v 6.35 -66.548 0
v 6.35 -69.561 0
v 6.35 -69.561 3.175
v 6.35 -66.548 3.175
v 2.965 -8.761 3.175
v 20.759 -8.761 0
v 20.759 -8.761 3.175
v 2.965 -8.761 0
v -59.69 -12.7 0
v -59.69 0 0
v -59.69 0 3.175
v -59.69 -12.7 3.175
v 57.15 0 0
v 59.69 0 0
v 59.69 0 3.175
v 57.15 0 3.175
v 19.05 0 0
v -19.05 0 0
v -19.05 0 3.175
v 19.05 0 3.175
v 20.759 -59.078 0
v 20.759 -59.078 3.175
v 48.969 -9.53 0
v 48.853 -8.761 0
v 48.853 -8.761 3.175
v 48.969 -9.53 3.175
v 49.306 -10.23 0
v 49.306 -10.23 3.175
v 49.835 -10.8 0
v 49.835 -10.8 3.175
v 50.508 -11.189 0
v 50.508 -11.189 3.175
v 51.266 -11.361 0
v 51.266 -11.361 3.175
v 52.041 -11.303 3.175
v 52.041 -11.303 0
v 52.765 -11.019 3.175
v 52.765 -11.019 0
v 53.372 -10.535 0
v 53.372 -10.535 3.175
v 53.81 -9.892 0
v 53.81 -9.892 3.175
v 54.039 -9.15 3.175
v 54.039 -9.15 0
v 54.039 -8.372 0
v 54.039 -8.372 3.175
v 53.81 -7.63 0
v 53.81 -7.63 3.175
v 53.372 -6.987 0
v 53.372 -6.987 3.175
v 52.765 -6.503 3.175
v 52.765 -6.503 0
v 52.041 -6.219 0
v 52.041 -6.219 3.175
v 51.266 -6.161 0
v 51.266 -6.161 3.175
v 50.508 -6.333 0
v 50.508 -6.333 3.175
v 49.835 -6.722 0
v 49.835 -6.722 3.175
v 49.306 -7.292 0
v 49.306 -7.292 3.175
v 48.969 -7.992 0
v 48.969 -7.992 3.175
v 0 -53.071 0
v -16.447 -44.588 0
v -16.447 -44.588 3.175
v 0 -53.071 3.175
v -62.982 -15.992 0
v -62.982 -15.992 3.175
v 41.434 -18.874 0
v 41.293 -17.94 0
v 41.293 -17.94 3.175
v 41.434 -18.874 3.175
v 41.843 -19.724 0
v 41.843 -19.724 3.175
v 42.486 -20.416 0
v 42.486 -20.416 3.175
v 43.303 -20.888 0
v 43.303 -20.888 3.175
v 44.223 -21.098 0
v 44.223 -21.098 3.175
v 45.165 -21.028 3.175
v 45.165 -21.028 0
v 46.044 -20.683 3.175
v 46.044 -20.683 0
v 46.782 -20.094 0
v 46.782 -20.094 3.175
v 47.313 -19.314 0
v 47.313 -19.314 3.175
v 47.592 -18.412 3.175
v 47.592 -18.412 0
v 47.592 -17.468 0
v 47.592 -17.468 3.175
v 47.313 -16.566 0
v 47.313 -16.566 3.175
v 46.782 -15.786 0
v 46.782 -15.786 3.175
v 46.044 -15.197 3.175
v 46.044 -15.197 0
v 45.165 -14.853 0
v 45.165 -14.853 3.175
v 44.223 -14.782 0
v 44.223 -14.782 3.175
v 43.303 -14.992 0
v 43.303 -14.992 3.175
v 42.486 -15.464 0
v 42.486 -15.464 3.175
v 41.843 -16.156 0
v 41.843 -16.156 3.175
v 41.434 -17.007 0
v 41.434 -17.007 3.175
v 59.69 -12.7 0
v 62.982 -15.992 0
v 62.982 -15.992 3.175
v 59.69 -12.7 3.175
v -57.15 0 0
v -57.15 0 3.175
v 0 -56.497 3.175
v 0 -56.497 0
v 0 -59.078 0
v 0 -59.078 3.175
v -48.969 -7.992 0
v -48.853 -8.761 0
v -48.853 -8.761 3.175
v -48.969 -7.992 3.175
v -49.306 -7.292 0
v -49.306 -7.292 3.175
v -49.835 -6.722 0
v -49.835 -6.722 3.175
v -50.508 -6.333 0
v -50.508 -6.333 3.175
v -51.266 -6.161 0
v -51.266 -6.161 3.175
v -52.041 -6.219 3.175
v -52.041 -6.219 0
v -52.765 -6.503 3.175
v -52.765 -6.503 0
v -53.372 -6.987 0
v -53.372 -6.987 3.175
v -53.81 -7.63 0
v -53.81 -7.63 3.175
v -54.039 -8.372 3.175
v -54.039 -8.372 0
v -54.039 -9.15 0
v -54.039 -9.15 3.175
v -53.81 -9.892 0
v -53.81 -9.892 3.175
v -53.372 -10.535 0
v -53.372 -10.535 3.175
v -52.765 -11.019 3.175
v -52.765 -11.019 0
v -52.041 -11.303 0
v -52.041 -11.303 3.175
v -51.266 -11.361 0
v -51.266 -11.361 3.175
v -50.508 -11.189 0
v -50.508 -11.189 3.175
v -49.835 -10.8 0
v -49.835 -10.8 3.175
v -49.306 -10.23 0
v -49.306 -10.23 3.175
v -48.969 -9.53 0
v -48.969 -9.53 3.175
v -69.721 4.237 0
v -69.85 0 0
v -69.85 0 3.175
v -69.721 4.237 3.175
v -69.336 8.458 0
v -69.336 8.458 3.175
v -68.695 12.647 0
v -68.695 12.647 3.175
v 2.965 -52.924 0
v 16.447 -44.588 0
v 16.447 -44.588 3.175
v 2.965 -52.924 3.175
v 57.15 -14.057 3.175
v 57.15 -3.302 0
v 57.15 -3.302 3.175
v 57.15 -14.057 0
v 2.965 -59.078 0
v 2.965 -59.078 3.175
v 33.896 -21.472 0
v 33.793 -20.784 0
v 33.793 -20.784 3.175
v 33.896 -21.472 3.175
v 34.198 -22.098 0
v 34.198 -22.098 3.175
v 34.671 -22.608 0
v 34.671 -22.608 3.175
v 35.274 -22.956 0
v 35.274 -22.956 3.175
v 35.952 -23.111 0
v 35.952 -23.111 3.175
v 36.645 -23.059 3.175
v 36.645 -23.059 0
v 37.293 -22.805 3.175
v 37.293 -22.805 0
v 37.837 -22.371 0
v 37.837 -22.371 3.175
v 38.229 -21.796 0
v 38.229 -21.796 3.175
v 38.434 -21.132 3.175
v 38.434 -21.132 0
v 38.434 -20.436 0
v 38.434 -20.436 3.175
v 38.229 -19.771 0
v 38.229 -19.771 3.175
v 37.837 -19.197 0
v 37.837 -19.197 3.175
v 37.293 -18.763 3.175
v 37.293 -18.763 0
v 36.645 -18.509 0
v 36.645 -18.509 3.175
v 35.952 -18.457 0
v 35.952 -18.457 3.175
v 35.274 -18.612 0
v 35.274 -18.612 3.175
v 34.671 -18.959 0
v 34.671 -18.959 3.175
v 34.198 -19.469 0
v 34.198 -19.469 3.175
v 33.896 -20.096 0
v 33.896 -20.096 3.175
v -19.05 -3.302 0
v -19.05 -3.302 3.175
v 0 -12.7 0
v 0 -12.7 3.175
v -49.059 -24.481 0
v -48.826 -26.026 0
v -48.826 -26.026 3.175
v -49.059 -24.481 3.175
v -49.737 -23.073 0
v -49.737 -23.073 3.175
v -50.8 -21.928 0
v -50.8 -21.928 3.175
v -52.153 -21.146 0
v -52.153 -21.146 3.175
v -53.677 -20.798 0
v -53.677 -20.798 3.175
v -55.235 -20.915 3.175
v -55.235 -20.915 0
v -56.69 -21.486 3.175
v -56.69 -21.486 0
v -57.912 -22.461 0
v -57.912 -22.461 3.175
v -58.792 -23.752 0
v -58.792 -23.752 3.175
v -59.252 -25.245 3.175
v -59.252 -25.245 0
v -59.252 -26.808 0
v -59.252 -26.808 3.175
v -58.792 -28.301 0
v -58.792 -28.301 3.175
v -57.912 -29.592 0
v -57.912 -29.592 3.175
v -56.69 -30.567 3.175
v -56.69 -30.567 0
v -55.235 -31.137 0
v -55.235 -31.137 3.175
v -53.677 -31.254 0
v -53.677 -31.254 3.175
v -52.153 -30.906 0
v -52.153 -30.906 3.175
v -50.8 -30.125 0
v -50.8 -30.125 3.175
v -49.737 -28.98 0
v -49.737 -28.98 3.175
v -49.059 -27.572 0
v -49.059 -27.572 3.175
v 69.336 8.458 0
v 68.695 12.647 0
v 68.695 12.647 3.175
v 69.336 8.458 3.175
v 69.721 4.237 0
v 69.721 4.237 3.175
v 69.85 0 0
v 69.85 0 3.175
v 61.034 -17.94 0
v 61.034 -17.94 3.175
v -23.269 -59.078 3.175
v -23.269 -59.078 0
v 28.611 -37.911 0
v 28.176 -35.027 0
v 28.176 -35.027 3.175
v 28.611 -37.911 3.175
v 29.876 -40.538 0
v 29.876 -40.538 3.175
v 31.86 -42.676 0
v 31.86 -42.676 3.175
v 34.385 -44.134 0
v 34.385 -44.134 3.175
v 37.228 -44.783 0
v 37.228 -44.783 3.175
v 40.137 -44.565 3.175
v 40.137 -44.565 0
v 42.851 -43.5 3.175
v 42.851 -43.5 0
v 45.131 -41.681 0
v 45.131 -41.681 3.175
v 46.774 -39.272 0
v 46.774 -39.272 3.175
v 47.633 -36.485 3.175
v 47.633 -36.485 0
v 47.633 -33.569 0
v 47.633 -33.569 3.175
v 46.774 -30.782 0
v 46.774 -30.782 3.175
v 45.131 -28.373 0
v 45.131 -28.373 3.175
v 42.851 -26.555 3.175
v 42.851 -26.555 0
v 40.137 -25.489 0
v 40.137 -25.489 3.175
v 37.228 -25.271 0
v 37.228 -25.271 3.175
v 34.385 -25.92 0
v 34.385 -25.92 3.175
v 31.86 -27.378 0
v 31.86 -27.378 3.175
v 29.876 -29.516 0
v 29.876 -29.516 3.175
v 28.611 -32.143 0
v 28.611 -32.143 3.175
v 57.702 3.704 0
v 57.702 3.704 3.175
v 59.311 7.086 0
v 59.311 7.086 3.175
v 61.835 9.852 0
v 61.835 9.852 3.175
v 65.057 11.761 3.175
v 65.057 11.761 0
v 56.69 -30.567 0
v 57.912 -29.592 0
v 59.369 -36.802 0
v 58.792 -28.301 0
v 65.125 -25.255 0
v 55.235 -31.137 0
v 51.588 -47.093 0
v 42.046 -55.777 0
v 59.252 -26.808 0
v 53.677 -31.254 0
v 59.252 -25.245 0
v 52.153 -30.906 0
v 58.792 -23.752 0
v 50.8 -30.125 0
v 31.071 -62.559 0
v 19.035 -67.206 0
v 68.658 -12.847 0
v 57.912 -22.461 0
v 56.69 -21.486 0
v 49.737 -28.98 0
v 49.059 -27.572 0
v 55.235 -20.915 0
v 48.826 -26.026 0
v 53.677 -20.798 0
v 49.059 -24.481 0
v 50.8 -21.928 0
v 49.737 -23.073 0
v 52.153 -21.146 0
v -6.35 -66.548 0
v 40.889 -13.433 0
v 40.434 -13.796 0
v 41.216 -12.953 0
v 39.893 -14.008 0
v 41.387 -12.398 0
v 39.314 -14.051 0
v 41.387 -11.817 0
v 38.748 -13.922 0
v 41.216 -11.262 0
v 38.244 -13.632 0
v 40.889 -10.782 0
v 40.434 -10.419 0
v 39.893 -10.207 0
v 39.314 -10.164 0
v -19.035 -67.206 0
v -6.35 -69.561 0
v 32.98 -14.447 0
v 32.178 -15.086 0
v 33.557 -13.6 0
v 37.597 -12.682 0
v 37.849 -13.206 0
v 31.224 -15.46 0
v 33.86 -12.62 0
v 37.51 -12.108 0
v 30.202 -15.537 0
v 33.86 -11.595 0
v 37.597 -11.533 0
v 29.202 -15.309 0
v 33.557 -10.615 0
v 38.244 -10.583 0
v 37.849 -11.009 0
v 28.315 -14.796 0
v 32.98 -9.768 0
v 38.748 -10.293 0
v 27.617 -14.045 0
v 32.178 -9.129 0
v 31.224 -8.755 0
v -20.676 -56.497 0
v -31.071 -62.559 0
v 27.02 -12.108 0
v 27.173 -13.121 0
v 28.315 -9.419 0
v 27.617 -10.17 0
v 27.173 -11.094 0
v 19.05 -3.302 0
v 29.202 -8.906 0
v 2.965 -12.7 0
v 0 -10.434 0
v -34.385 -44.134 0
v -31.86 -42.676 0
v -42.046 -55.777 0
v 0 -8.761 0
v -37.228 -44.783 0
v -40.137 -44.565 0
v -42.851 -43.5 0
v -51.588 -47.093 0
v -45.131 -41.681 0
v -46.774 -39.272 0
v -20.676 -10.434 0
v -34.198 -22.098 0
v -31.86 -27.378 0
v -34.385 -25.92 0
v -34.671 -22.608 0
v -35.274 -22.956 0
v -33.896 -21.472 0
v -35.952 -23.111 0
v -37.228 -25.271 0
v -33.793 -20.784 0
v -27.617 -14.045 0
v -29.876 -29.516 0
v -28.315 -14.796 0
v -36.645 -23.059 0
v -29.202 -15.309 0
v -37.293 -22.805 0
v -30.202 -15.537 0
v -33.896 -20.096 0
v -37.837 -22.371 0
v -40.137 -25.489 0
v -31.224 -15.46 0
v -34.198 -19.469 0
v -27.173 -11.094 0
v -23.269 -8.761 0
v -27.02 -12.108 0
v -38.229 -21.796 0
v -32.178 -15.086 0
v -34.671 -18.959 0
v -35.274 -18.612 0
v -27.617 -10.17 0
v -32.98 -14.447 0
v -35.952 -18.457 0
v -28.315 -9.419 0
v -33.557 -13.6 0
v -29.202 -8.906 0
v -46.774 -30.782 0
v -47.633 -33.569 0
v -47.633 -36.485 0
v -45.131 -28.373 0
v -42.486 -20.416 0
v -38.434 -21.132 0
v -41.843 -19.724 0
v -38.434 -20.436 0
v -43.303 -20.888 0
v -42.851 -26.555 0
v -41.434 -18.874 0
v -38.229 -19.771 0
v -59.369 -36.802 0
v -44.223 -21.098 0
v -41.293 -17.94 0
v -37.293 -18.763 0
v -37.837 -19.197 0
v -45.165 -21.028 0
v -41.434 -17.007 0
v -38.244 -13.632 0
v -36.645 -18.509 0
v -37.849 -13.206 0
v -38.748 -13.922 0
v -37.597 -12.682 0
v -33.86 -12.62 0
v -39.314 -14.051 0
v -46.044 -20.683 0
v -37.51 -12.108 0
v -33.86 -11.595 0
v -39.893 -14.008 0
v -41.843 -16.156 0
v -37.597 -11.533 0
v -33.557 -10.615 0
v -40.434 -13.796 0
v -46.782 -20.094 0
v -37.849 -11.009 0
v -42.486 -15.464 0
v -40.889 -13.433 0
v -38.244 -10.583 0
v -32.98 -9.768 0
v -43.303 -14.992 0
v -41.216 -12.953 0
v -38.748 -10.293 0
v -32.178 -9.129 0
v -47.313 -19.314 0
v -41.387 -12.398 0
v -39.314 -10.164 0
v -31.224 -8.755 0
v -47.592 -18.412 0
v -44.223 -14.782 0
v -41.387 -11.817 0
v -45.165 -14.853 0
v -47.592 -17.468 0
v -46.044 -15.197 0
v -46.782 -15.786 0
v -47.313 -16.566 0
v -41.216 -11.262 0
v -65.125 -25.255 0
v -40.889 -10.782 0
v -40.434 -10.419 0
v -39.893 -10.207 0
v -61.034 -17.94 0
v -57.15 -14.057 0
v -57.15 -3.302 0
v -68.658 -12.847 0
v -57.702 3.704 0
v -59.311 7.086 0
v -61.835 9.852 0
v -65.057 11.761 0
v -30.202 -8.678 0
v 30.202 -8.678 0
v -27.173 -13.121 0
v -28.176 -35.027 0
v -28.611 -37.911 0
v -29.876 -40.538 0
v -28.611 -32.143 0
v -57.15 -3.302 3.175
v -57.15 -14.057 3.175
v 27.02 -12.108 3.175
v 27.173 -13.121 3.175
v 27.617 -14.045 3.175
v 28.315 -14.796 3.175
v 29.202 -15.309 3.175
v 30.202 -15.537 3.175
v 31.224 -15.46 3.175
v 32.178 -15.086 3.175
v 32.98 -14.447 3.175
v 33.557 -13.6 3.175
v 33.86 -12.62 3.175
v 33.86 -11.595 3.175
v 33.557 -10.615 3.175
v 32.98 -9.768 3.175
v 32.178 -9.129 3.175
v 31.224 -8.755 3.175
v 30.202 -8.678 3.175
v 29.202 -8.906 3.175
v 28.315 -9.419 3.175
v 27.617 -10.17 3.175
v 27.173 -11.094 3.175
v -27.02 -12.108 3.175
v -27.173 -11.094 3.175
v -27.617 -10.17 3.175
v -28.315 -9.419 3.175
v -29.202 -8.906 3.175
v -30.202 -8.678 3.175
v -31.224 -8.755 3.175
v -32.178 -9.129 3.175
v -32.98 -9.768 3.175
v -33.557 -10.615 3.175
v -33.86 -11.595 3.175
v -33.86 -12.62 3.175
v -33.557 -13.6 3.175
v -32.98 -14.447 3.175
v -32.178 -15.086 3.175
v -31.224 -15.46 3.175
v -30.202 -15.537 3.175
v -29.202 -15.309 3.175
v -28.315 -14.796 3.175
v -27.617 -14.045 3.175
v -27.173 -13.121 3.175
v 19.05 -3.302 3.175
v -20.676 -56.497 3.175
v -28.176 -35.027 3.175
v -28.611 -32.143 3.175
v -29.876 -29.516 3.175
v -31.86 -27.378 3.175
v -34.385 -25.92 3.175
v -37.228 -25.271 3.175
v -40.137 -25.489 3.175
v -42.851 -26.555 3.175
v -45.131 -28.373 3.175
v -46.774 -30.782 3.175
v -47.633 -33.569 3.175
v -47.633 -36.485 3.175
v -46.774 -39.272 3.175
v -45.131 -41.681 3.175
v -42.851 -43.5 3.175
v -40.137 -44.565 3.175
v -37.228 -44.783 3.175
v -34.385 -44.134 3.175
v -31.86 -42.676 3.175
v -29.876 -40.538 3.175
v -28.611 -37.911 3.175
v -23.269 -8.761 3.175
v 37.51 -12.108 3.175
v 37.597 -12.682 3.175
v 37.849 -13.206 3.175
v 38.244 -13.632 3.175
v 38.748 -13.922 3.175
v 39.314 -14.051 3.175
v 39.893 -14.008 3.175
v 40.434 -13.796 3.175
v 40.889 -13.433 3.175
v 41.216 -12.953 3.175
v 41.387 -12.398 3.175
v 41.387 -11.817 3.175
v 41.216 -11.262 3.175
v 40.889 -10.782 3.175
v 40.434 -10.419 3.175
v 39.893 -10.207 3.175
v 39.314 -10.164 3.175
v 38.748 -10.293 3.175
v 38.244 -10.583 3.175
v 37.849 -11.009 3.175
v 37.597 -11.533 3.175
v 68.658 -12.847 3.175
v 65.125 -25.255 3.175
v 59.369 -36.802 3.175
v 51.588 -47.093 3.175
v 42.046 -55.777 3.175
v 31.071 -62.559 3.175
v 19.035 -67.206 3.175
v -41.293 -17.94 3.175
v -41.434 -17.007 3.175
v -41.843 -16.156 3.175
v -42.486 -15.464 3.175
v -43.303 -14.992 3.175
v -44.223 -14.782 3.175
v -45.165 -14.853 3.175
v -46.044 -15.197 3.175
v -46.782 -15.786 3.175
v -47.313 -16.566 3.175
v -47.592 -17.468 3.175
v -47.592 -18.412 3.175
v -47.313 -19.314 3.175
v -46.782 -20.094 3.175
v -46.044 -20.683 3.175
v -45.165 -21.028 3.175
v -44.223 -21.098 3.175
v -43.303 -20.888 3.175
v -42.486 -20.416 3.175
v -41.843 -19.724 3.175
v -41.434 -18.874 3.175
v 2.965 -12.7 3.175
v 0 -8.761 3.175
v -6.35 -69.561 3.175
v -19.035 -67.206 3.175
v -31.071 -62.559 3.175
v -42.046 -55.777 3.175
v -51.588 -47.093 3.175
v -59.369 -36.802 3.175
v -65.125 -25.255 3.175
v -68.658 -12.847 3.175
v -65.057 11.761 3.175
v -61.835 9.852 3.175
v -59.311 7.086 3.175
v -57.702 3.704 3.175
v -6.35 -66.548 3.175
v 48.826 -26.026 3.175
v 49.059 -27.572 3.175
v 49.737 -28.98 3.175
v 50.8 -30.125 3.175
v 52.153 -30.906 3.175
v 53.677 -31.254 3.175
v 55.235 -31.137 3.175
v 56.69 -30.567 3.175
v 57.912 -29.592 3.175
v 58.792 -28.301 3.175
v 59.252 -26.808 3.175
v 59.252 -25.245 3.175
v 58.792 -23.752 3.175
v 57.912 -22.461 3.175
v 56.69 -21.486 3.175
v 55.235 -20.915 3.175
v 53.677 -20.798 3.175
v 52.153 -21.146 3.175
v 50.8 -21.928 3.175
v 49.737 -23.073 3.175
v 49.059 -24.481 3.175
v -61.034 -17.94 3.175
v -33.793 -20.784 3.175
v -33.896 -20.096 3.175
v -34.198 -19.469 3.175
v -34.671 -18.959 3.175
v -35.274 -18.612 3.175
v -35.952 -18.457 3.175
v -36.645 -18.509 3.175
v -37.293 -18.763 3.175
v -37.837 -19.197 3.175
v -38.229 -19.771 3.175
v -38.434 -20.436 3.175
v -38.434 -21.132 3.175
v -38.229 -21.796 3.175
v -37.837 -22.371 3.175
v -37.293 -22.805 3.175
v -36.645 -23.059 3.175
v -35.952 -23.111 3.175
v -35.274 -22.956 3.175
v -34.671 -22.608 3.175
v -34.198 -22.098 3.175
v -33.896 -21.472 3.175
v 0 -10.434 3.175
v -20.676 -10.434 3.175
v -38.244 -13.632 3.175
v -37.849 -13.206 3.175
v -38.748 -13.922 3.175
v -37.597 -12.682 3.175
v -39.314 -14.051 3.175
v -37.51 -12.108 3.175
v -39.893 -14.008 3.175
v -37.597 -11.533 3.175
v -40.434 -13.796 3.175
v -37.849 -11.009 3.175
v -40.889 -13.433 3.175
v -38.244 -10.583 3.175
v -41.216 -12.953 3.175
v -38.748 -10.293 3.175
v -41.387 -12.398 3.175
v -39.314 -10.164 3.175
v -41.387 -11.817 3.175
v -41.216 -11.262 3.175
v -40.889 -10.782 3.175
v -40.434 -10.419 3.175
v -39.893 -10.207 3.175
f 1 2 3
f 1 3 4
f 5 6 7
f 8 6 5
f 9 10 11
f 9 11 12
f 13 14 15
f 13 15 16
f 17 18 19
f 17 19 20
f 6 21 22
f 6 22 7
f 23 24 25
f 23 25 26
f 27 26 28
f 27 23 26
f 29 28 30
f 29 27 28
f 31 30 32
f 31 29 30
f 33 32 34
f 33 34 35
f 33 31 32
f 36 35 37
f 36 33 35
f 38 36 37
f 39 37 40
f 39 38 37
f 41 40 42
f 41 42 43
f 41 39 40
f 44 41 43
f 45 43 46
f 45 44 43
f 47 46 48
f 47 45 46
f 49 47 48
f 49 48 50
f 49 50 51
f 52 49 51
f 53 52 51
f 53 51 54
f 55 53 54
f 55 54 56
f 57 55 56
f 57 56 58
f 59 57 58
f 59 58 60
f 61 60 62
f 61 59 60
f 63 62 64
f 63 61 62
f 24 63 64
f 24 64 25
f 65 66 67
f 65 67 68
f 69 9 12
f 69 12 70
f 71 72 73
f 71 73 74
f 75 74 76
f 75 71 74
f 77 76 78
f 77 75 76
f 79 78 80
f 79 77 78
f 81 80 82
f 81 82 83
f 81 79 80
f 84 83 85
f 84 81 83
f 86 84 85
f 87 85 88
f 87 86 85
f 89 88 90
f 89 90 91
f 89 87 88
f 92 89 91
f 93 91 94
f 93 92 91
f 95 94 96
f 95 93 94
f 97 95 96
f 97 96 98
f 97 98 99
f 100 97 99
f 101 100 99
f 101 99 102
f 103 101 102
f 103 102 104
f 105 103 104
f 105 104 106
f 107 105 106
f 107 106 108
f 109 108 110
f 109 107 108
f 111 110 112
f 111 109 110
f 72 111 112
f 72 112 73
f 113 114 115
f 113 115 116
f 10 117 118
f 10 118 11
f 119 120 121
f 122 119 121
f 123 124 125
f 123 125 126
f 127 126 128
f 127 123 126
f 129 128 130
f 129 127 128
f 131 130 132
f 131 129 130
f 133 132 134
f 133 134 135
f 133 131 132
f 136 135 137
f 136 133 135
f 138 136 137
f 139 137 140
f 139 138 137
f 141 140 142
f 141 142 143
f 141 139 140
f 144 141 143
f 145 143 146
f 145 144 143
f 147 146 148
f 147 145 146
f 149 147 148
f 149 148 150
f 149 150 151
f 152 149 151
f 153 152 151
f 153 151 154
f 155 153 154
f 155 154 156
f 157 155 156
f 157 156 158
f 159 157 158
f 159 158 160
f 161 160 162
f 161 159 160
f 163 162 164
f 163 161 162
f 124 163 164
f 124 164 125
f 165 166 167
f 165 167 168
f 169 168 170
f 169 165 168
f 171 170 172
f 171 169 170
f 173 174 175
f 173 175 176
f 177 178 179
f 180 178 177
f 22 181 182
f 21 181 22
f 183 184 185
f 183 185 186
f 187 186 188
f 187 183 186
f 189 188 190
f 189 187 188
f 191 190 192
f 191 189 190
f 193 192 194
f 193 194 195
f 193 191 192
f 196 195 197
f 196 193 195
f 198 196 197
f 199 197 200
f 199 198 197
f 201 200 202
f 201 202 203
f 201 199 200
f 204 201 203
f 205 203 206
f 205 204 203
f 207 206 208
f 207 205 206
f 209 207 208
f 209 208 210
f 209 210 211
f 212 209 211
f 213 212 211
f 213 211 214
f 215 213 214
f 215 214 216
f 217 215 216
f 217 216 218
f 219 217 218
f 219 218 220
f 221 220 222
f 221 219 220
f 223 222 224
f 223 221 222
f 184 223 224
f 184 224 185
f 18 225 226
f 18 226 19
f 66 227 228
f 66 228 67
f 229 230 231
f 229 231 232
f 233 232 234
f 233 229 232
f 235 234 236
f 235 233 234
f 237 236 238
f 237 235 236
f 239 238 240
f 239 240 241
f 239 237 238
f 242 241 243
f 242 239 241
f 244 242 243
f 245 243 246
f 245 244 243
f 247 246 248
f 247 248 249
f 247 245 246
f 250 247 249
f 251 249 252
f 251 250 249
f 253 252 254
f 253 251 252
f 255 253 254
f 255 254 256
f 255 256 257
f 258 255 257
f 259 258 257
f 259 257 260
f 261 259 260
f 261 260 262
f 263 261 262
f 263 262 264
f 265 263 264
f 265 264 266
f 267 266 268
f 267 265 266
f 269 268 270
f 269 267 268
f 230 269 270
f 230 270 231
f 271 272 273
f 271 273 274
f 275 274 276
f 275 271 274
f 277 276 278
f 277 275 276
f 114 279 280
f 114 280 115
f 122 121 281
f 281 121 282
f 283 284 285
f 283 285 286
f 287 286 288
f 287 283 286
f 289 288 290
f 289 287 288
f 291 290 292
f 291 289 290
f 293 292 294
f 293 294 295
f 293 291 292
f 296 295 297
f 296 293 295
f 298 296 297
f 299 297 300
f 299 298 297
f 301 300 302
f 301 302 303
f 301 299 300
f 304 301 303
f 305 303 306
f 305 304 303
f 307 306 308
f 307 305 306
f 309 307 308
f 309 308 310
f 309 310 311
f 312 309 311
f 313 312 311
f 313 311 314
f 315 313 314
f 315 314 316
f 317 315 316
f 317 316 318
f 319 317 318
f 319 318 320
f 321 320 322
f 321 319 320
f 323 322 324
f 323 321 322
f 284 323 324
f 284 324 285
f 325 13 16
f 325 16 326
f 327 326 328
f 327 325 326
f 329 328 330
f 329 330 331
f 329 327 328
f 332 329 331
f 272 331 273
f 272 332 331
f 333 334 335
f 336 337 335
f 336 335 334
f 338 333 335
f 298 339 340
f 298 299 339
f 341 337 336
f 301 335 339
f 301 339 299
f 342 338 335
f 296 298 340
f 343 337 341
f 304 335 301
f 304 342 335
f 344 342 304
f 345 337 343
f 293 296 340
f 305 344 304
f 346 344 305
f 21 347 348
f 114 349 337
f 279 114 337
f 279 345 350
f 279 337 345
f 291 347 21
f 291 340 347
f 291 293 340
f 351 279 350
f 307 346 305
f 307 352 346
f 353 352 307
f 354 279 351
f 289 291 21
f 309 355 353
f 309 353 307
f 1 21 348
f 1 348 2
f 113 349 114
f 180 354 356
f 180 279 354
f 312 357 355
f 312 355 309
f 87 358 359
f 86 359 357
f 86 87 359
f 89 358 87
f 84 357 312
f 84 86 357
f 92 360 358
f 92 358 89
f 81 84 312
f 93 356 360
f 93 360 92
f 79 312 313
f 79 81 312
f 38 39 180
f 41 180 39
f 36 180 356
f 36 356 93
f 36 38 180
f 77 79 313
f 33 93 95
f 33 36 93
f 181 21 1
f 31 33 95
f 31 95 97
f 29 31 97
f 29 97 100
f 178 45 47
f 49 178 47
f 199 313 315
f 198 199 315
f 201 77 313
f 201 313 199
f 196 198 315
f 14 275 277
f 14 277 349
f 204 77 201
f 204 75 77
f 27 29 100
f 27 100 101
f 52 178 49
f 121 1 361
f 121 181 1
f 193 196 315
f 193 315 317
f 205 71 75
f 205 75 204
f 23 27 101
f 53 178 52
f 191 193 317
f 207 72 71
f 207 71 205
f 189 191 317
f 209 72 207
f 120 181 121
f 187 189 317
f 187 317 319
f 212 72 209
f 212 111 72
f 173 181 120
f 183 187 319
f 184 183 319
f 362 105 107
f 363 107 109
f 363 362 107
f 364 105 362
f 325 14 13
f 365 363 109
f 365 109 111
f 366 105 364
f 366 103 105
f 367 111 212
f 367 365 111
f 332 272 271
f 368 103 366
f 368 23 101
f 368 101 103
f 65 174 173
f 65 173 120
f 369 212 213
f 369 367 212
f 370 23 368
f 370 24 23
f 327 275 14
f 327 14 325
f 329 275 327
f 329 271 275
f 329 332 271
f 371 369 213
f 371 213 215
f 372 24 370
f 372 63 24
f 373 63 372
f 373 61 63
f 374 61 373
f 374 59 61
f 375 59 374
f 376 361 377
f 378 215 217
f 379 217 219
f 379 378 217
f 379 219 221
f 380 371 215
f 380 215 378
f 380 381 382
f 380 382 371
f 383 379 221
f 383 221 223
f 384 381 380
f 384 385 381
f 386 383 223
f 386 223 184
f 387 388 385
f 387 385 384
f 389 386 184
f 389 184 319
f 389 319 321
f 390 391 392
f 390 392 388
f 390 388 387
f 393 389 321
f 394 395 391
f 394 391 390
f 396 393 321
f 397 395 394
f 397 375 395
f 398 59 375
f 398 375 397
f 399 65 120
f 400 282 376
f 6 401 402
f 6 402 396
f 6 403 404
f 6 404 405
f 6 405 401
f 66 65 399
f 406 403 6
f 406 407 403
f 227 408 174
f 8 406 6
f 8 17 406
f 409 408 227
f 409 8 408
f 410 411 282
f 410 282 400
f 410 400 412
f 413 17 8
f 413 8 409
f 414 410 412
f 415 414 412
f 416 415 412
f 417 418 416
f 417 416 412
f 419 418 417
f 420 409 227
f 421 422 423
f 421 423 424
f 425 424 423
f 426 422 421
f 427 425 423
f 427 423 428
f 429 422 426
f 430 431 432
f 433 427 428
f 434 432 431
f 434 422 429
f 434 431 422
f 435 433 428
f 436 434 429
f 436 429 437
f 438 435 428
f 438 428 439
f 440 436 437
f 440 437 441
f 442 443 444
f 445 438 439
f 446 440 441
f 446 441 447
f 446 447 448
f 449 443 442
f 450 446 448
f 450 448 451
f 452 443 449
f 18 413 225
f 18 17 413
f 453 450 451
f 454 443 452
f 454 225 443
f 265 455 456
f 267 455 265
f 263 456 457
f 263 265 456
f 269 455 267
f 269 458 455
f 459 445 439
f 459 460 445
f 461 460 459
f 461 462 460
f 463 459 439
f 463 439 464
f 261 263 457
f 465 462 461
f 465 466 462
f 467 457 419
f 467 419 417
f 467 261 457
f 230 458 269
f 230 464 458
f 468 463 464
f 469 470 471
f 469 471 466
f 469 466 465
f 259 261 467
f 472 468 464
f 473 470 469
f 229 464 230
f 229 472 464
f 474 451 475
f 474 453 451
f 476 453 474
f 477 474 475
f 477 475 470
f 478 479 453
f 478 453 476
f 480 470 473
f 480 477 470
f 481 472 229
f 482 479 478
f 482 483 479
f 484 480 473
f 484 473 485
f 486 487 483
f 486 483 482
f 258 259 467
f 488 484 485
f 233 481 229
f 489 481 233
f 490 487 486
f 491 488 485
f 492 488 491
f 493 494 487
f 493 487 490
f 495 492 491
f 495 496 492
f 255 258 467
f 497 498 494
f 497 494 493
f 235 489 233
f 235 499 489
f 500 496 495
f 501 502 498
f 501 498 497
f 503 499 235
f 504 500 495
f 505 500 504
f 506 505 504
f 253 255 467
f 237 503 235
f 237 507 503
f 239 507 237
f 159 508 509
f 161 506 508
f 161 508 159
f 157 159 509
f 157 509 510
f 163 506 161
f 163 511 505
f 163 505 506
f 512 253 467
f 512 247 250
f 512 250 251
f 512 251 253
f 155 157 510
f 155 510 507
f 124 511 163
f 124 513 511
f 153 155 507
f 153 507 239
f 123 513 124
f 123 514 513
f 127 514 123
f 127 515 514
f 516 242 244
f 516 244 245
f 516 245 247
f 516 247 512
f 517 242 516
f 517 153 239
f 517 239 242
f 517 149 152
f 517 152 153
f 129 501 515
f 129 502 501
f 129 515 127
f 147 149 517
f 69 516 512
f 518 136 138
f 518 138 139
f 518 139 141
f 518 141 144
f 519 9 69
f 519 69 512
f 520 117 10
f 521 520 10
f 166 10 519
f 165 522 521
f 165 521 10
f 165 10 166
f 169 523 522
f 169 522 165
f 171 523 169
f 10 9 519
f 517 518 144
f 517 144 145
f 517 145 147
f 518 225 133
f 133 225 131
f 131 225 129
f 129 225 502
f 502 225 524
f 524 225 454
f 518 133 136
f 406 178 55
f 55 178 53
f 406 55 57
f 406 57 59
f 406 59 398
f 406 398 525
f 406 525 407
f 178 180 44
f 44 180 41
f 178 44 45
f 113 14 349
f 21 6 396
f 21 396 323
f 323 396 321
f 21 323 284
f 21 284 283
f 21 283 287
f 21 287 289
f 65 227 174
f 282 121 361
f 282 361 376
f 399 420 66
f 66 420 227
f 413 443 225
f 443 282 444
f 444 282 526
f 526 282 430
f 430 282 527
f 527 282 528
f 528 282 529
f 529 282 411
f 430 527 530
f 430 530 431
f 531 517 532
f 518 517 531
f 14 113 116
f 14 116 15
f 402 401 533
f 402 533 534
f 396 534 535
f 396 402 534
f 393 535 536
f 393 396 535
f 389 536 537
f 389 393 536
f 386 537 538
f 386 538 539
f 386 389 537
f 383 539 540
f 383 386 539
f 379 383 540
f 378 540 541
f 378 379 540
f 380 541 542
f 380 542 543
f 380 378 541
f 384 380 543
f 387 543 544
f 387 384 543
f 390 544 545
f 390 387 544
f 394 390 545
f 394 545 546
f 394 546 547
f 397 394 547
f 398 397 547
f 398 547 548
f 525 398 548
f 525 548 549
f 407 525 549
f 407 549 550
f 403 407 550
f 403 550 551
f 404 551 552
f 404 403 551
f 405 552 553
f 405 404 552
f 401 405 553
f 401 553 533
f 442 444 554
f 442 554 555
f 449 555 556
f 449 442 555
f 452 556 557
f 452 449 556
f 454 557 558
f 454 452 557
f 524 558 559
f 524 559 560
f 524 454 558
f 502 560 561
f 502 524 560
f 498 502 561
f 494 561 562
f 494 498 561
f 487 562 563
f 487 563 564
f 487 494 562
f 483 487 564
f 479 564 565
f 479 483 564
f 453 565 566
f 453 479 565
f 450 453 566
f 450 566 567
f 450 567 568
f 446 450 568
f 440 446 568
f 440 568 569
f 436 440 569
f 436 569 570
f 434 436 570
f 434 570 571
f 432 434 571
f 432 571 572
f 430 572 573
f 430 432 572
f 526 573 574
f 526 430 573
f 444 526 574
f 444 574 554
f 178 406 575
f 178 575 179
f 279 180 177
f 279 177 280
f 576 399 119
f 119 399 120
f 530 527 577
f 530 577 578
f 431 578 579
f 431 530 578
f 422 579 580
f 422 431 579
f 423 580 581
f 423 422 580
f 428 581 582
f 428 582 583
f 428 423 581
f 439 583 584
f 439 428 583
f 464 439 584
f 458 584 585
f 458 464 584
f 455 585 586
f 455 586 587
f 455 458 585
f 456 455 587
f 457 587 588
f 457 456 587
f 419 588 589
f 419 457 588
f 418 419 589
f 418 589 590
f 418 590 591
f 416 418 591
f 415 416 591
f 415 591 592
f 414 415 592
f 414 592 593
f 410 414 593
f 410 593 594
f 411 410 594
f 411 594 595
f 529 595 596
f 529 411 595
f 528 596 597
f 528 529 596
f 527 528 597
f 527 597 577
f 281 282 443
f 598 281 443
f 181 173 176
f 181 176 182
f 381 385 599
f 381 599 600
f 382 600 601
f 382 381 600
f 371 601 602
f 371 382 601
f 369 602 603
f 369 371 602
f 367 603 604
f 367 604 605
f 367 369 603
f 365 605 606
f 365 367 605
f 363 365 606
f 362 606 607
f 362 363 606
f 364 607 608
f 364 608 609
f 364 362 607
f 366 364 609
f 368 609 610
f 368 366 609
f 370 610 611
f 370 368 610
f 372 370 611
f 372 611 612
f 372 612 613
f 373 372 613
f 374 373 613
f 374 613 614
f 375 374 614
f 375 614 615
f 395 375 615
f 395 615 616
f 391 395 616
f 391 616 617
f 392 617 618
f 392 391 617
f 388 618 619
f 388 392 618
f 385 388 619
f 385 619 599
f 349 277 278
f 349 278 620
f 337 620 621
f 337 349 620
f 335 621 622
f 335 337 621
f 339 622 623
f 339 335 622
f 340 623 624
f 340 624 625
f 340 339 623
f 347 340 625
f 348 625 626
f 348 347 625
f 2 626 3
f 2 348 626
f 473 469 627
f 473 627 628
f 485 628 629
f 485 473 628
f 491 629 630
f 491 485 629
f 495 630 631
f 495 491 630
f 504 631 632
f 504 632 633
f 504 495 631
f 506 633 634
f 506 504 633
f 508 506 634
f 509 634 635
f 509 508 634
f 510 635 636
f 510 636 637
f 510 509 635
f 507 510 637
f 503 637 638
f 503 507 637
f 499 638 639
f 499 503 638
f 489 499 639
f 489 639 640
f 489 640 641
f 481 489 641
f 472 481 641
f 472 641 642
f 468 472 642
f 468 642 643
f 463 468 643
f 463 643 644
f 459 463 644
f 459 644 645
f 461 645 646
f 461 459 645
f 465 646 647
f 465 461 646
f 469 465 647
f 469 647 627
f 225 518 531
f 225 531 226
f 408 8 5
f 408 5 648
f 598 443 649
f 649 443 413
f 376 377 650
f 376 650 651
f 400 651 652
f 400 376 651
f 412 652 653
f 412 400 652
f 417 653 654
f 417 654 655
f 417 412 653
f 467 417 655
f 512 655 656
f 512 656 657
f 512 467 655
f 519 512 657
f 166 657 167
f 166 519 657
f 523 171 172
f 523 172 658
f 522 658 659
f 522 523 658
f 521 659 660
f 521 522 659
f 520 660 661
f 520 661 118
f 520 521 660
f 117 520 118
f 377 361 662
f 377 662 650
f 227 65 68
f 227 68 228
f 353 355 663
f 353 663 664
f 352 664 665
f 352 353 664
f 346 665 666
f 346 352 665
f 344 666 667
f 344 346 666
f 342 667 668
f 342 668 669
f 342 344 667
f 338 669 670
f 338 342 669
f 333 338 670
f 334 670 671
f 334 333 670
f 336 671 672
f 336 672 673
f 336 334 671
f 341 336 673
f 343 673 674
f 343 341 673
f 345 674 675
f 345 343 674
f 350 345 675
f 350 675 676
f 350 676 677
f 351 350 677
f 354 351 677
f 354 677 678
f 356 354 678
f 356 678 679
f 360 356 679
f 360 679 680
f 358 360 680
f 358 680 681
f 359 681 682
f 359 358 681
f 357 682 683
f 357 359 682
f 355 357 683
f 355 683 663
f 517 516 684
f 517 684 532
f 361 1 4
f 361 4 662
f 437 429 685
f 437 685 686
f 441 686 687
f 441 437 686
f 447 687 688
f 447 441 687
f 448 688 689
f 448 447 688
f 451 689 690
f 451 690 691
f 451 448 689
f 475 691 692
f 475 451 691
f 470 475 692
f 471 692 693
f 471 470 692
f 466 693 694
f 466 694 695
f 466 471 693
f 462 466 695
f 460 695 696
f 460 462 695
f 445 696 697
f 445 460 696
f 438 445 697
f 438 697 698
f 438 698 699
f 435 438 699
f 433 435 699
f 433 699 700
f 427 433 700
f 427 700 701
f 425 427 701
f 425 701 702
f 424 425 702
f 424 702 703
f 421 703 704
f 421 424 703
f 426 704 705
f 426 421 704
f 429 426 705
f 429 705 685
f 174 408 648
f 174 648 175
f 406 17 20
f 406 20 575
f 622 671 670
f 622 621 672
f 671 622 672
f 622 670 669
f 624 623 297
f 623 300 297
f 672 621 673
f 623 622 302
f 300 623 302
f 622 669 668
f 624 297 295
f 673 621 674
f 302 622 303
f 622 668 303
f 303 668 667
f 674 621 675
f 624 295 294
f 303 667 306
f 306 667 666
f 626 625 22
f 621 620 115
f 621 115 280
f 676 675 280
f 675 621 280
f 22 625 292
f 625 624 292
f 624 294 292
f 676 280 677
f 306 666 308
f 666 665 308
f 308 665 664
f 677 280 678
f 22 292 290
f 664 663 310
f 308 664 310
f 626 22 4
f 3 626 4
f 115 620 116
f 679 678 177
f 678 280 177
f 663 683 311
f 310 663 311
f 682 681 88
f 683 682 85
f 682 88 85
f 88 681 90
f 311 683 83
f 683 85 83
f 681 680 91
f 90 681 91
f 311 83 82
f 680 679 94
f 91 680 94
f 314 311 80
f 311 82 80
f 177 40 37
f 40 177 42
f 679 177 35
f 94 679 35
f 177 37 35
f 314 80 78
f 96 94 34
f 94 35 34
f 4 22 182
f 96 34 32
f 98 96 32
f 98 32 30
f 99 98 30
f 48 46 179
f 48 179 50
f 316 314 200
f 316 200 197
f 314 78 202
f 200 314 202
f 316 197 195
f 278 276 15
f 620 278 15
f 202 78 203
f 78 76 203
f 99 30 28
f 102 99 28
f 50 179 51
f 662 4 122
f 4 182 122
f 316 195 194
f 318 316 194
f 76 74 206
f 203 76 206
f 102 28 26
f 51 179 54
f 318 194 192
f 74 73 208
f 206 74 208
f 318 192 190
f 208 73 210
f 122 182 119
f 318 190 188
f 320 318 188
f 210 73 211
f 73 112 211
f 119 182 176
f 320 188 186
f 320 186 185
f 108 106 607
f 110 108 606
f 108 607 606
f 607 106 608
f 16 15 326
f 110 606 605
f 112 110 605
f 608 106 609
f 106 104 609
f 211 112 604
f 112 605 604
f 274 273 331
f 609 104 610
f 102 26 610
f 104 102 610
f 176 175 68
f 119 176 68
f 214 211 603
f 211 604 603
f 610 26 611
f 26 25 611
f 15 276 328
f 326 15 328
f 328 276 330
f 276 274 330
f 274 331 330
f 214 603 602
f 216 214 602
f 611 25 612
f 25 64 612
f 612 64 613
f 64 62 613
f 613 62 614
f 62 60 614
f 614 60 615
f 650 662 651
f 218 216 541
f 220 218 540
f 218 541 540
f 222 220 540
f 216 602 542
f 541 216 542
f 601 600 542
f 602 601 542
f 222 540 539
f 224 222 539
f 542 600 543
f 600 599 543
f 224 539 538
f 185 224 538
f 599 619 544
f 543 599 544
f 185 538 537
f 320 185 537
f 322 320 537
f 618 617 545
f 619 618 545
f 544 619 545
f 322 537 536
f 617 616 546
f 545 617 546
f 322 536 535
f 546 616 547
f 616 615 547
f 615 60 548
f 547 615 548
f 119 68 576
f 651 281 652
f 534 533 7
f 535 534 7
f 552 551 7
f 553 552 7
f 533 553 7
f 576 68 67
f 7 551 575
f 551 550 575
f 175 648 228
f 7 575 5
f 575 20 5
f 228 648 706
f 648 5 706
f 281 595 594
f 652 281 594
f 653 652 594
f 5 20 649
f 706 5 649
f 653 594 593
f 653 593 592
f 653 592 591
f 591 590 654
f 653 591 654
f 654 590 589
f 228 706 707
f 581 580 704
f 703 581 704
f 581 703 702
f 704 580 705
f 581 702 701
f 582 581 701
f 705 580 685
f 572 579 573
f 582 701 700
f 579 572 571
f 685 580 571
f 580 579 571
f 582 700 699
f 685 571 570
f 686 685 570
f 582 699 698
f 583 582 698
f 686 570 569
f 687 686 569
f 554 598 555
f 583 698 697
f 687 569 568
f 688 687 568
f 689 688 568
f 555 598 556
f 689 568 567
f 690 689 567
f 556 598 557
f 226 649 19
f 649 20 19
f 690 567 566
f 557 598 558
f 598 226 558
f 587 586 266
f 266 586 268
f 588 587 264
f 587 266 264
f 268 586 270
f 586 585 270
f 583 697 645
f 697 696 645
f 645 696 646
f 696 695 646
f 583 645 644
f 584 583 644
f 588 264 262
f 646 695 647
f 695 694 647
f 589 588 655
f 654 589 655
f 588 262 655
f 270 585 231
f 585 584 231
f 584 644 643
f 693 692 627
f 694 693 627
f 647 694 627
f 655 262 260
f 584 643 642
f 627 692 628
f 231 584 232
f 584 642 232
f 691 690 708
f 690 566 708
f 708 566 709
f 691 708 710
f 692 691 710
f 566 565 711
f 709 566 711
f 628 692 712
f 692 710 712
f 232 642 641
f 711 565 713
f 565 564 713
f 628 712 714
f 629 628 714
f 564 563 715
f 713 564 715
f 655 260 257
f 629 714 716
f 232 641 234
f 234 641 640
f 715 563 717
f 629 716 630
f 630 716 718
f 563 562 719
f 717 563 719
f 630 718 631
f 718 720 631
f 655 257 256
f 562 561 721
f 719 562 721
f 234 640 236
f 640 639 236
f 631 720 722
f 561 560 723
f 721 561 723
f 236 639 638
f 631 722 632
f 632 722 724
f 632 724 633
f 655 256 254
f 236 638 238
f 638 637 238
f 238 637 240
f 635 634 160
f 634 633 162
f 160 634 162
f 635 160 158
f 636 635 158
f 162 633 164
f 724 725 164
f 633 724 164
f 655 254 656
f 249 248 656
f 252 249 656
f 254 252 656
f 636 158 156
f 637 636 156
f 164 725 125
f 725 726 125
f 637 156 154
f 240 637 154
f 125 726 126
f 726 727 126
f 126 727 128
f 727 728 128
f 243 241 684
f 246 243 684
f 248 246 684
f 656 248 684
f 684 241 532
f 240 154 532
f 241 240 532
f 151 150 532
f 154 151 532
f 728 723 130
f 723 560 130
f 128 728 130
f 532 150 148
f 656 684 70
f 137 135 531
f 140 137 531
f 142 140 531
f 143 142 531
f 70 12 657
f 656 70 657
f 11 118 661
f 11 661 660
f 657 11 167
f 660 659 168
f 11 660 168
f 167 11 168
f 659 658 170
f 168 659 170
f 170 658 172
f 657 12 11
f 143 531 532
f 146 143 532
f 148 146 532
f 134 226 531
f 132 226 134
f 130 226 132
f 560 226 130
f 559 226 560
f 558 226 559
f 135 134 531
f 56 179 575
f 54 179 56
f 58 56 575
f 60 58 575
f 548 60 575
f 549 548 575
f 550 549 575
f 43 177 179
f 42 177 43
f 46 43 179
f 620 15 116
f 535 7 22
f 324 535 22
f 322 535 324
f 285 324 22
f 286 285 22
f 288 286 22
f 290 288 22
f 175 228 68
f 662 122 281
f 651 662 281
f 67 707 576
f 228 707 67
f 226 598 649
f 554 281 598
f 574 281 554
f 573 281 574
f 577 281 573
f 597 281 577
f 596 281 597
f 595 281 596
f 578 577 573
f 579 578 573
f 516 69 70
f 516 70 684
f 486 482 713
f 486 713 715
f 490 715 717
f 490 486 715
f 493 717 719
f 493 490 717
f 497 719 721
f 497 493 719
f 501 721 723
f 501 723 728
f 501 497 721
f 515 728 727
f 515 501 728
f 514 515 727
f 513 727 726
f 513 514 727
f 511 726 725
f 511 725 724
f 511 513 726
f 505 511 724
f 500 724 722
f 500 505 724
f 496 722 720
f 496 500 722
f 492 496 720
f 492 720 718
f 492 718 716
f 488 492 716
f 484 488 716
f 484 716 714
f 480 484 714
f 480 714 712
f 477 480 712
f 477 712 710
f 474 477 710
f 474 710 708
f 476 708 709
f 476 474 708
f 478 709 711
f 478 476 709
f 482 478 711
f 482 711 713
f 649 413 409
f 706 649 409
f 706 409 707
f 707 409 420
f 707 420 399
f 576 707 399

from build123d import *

# Parameters (mm, degrees)
SKETCH1_R           = 2.60777722
SKETCH1_R_2         = 5.242542832
SKETCH1_R_3         = 3.166937391
SKETCH1_R_4         = 9.783190039
SKETCH1_R_5         = 3.439146742
SKETCH1_R_6         = 2.333532814
SKETCH1_R_7         = 1.949356062
BOSS_EXTRUDE1_DEPTH = 3.175


with BuildPart() as part:
    # Sketch1 → Boss-Extrude1 (new body)
    with BuildSketch(Plane.XY):
        with BuildLine():
            Line((-57.15, 0), (-59.69, 0))
            Line((-59.69, 0), (-59.69, -12.7))
            Line((-59.69, -12.7), (-62.981786531, -15.991786531))
            Line((-62.981786531, -15.991786531), (-61.033522603, -17.940050458))
            Line((-61.033522603, -17.940050458), (-57.15, -14.056527855))
            Line((-57.15, -14.056527855), (-57.15, -3.302))
            Line((-57.15, -3.302), (-19.05, -3.302))
            Line((-19.05, -3.302), (-19.05, 0))
            Line((-19.05, 0), (19.05, 0))
            Line((19.05, 0), (19.05, -3.302))
            Line((19.05, -3.302), (57.15, -3.302))
            Line((57.15, -3.302), (57.15, -14.056527855))
            Line((57.15, -14.056527855), (61.033522603, -17.940050458))
            Line((61.033522603, -17.940050458), (62.981786531, -15.991786531))
            Line((62.981786531, -15.991786531), (59.69, -12.7))
            Line((59.69, -12.7), (59.69, 0))
            Line((59.69, 0), (57.15, 0))
            ThreePointArc((57.15, 0), (60.470428387, 8.562338253), (68.695454545, 12.647411782))
            ThreePointArc((68.695454545, 12.647411782), (69.560764803, 6.35), (69.85, 0))
            ThreePointArc((69.85, 0), (51.587643869, -47.092860393), (6.35, -69.560764803))
            Line((6.35, -69.560764803), (6.35, -66.548))
            Line((6.35, -66.548), (-6.35, -66.548))
            Line((-6.35, -66.548), (-6.35, -69.560764803))
            ThreePointArc((-6.35, -69.560764803), (-51.587643869, -47.092860393), (-69.85, 0))
            ThreePointArc((-69.85, 0), (-69.560764803, 6.35), (-68.695454545, 12.647411782))
            ThreePointArc((-68.695454545, 12.647411782), (-60.470428387, 8.562338253), (-57.15, 0))
        make_face()
        with Locations((-51.460707528, -8.761001901)):
            Circle(SKETCH1_R, mode=Mode.SUBTRACT)
        with Locations((-54.068484748, -26.026352242)):
            Circle(SKETCH1_R_2, mode=Mode.SUBTRACT)
        with Locations((-44.460109085, -17.940050458)):
            Circle(SKETCH1_R_3, mode=Mode.SUBTRACT)
        with Locations((-37.959553388, -35.027121669)):
            Circle(SKETCH1_R_4, mode=Mode.SUBTRACT)
        with Locations((-30.458912199, -12.107533279)):
            Circle(SKETCH1_R_5, mode=Mode.SUBTRACT)
        with Locations((-36.126063319, -20.78380941)):
            Circle(SKETCH1_R_6, mode=Mode.SUBTRACT)
        with Locations((-39.459681626, -12.107533279)):
            Circle(SKETCH1_R_7, mode=Mode.SUBTRACT)
        with Locations(Location((37.959553388, -35.027121669, 0), (0, 0, 180))):
            Circle(SKETCH1_R_4, mode=Mode.SUBTRACT)
        with Locations(Location((36.126063319, -20.78380941, 0), (0, 0, 180))):
            Circle(SKETCH1_R_6, mode=Mode.SUBTRACT)
        with Locations(Location((30.458912199, -12.107533279, 0), (0, 0, 180))):
            Circle(SKETCH1_R_5, mode=Mode.SUBTRACT)
        with Locations(Location((39.459681626, -12.107533279, 0), (0, 0, 180))):
            Circle(SKETCH1_R_7, mode=Mode.SUBTRACT)
        with Locations(Location((44.460109085, -17.940050458, 0), (0, 0, 180))):
            Circle(SKETCH1_R_3, mode=Mode.SUBTRACT)
        with Locations(Location((54.068484748, -26.026352242, 0), (0, 0, 180))):
            Circle(SKETCH1_R_2, mode=Mode.SUBTRACT)
        with Locations(Location((51.460707528, -8.761001901, 0), (0, 0, 180))):
            Circle(SKETCH1_R, mode=Mode.SUBTRACT)
        Polygon((0, -12.7), (-16.44651858, -44.588157329), (0, -53.07055318), align=None, mode=Mode.SUBTRACT)
        Polygon((16.44651858, -44.588157329), (2.965479923, -52.923865877), (2.965479923, -59.078158296), (20.758668378, -59.078158296), (20.758668378, -8.761001901), (2.965479923, -8.761001901), (2.965479923, -12.7), align=None, mode=Mode.SUBTRACT)
        Polygon((0, -59.078158296), (-23.268802527, -59.078158296), (-23.268802527, -12.107533279), (-23.268802527, -8.761001901), (0, -8.761001901), (0, -10.43426759), (-20.676383037, -10.43426759), (-20.676383037, -56.497278023), (0, -56.497278023), align=None, mode=Mode.SUBTRACT)
    extrude(amount=BOSS_EXTRUDE1_DEPTH)


solid = part.part
